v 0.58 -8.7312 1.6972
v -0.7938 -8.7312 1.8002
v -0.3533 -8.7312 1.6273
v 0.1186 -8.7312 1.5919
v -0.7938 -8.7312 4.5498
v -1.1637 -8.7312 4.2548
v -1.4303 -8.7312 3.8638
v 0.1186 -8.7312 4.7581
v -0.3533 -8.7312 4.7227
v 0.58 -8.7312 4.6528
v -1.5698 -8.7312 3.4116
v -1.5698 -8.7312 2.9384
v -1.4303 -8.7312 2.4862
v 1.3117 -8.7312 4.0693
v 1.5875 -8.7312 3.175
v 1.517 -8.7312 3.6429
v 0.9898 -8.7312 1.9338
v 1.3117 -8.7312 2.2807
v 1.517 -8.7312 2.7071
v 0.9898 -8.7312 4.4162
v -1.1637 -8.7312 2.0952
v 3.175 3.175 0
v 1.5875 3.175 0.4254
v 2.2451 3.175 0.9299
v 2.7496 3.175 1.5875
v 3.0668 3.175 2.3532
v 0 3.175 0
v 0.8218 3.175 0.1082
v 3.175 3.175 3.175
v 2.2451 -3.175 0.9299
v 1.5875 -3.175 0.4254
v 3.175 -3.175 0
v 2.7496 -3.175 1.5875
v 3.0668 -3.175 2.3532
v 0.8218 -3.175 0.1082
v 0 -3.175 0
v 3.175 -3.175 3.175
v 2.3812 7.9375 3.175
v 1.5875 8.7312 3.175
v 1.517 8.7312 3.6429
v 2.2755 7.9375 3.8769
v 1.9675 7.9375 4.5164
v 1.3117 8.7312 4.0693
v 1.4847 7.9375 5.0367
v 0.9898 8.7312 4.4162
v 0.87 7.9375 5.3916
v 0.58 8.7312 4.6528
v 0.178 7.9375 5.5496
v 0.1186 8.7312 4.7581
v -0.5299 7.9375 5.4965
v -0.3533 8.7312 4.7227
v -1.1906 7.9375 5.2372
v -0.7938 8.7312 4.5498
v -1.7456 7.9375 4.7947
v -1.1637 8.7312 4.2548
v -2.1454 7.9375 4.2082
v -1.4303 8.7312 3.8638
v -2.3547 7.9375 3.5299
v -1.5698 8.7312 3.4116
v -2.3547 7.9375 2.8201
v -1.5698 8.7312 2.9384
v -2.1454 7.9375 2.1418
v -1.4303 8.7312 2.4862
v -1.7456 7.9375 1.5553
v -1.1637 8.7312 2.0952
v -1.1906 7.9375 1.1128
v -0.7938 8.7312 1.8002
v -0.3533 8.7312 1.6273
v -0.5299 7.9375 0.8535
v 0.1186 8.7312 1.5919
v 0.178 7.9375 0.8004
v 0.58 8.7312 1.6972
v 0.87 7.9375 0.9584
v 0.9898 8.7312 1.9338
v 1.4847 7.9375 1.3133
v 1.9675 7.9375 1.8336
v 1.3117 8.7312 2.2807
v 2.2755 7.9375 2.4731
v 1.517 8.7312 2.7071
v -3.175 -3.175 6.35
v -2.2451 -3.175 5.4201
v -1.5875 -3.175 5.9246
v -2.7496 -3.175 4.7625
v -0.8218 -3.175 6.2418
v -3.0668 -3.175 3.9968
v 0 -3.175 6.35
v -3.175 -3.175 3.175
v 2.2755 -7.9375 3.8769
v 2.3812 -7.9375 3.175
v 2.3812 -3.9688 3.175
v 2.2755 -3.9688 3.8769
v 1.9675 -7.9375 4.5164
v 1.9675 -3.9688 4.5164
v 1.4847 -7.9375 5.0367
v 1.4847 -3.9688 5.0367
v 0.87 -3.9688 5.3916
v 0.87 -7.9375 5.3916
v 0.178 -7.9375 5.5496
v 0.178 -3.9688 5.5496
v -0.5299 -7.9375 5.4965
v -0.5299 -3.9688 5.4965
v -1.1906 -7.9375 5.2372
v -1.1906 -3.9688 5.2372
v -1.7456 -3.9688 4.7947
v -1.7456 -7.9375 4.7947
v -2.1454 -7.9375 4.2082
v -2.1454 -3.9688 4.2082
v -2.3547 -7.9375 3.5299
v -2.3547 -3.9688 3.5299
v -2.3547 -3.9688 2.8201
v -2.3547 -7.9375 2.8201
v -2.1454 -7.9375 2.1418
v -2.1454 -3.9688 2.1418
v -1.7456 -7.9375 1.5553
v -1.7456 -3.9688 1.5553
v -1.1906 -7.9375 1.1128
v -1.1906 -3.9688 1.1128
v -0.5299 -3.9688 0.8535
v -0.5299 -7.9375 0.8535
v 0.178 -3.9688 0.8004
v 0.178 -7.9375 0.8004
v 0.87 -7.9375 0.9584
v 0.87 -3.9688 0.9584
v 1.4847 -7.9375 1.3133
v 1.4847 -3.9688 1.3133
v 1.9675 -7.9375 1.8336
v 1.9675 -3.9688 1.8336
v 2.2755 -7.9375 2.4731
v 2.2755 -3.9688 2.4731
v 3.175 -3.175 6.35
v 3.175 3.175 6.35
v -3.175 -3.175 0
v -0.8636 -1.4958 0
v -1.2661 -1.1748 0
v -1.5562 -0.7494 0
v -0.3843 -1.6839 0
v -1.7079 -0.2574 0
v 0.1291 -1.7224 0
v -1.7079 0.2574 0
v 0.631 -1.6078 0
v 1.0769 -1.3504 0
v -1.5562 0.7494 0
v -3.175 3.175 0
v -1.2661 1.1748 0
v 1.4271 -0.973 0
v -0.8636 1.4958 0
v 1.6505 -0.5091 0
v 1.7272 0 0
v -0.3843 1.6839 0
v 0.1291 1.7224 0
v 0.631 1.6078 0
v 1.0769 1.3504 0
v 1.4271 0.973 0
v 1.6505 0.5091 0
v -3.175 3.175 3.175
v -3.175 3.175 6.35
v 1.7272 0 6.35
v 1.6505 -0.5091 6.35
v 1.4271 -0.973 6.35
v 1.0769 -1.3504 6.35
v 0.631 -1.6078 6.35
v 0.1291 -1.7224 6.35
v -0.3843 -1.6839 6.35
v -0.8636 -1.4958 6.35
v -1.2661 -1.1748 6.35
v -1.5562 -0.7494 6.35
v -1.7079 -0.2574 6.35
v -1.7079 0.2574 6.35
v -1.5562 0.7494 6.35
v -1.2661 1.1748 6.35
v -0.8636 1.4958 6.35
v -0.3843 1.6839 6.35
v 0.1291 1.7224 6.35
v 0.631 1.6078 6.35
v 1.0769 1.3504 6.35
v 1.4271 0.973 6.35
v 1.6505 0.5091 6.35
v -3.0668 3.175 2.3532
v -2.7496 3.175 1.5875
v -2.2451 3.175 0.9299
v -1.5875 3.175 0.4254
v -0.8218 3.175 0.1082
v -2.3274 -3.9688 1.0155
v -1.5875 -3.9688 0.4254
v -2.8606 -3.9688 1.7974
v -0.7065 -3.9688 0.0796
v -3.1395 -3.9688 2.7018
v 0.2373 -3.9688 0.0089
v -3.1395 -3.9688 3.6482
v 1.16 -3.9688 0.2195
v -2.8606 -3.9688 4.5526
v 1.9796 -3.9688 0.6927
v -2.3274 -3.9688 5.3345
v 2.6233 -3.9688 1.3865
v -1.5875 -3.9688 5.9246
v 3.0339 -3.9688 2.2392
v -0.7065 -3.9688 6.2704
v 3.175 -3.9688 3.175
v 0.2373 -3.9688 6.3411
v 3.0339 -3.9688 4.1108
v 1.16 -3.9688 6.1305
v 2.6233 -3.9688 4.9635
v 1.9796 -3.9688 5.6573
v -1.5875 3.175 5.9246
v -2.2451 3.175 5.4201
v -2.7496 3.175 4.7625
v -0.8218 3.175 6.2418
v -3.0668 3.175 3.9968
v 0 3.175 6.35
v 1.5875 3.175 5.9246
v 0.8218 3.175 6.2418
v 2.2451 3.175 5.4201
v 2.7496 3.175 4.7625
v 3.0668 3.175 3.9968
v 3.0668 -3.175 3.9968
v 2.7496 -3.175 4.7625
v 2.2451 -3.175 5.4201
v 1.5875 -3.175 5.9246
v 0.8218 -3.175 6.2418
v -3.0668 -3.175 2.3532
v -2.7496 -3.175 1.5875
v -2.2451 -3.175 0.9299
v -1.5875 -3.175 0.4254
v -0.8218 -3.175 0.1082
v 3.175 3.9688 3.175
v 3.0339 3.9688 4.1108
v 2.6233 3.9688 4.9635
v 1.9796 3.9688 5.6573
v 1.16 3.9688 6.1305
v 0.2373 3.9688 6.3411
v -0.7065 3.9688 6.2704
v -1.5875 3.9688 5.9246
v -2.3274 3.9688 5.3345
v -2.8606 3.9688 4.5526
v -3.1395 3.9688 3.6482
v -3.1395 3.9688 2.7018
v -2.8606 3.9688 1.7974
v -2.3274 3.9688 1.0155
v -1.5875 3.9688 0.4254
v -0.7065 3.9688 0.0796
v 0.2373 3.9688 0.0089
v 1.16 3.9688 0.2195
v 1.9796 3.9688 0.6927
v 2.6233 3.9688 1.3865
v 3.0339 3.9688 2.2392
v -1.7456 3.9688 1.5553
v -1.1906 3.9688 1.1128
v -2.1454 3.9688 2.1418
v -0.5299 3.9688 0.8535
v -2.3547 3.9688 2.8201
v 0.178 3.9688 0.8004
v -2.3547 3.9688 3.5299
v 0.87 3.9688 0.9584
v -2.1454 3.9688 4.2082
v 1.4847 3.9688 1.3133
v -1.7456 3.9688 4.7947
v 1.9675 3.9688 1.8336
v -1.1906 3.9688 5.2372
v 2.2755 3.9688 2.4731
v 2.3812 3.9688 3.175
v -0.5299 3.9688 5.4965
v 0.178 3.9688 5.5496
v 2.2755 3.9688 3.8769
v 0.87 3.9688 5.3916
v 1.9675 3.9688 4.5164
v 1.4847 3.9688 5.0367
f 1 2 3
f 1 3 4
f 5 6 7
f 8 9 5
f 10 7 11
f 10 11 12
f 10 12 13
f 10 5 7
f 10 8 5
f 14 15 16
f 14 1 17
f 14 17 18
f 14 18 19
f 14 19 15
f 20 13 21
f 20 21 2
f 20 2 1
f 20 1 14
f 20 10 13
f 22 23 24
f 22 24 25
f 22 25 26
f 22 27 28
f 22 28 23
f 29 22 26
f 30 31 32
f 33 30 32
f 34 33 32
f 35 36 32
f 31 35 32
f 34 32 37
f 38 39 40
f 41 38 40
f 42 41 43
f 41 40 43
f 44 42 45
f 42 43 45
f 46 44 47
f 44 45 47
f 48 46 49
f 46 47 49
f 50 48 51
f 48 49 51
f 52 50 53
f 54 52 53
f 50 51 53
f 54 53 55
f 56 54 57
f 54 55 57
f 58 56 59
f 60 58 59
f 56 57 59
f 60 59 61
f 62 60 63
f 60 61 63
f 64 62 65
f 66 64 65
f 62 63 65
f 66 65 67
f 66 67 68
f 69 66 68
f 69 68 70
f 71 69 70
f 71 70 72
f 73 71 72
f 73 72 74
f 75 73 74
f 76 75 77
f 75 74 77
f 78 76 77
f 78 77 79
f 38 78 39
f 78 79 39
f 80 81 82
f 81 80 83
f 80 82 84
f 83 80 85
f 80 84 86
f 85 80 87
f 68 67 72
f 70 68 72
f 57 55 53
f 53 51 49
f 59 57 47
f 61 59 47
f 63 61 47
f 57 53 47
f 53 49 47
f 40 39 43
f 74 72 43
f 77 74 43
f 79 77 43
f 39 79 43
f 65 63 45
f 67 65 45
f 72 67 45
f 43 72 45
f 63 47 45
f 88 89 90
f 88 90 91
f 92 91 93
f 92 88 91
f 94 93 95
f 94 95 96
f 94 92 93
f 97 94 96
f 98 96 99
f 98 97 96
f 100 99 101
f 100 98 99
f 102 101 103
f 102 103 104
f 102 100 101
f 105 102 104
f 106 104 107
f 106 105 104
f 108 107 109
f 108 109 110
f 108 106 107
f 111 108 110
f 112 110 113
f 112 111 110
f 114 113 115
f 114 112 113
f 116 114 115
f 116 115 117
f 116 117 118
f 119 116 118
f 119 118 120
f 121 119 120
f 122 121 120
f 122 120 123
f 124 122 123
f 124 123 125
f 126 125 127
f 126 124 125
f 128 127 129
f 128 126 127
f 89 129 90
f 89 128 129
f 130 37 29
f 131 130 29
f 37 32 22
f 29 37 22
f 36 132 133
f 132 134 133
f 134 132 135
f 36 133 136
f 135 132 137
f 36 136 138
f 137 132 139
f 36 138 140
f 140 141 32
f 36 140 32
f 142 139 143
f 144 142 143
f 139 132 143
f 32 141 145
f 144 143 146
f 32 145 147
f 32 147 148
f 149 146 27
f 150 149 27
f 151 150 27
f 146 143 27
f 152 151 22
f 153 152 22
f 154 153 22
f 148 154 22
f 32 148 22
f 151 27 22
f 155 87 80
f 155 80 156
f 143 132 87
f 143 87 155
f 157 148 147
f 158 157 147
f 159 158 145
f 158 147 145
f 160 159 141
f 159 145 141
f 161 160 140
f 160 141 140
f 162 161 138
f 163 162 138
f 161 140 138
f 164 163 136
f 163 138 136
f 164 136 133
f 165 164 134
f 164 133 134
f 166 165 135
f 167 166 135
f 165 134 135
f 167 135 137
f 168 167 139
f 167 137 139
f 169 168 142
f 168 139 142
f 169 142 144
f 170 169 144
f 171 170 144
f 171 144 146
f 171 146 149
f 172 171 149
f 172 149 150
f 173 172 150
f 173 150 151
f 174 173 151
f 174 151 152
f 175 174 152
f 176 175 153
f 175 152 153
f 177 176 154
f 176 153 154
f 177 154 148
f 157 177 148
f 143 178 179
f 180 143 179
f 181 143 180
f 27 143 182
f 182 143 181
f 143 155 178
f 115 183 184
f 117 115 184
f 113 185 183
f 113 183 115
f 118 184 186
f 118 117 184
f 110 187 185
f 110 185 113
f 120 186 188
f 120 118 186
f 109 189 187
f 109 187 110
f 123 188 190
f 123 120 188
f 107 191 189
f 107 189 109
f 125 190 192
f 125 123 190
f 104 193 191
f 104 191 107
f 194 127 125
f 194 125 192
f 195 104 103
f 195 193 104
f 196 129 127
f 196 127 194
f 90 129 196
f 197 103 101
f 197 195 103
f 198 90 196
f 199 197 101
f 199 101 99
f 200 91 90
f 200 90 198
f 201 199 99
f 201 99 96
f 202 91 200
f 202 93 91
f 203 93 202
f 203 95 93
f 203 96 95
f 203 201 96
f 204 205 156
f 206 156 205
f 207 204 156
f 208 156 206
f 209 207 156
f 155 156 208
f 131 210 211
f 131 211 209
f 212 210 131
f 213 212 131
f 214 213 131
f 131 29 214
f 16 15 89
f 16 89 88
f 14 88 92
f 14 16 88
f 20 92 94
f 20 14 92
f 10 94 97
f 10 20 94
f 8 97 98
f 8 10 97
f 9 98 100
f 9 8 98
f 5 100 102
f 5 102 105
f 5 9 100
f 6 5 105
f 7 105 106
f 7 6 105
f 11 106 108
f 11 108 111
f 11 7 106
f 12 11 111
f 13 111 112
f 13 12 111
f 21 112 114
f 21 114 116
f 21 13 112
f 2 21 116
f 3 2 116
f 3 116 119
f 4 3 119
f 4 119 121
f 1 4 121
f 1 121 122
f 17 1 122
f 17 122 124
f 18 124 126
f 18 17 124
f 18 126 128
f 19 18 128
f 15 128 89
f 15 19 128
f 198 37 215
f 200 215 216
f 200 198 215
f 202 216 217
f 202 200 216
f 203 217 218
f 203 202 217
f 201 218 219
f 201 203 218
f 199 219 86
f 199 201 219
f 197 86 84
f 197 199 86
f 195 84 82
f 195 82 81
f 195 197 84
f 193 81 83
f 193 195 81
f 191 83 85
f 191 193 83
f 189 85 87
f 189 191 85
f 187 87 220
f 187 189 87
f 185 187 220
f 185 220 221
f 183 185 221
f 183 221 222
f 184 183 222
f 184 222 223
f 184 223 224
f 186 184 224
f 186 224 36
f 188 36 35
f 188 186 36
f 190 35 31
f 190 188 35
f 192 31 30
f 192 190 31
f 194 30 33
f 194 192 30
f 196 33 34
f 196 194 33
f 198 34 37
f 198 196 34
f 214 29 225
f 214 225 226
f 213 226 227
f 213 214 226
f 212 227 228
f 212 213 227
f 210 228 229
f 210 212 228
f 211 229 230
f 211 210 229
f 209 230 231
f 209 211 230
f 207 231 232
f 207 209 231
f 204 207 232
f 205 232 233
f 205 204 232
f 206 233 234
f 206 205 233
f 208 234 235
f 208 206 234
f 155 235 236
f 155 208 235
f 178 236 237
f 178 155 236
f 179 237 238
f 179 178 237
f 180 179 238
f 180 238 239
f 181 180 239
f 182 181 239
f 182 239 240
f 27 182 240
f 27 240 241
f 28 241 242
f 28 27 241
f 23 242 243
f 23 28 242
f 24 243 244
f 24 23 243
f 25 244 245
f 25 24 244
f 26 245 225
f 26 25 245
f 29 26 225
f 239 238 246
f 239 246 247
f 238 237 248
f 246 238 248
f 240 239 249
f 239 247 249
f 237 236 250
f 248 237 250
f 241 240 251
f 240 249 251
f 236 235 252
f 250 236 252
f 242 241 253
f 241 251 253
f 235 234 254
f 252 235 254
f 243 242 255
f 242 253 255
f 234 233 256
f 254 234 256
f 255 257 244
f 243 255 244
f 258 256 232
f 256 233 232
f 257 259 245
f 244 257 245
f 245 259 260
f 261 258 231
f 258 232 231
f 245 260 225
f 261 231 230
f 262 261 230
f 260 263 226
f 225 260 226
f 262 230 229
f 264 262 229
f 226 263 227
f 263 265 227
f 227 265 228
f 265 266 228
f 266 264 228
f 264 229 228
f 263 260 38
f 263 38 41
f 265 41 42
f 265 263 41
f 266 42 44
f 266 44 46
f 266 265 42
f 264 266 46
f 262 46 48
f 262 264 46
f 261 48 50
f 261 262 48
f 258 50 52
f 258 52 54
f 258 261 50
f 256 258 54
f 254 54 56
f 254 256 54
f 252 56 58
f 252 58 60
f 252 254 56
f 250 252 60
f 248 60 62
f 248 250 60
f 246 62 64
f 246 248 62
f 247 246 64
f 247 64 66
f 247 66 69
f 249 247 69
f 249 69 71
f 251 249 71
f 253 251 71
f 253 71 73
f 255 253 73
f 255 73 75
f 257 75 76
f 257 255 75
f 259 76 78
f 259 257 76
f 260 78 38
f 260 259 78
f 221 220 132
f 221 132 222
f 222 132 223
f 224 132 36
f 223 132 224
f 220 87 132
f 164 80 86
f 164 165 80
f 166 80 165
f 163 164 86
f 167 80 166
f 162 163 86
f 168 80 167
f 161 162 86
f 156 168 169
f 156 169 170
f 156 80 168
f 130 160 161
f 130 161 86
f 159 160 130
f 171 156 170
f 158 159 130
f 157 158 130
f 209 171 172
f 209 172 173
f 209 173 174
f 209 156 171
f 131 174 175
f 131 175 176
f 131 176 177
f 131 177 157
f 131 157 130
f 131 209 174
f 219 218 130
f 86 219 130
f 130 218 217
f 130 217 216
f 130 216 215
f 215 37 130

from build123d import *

# Parameters (mm, degrees)
F0_W     = 6.35
F0_H     = 6.35
F1_DEPTH = 6.35
F2_R     = 3.175
F3_DEPTH = 3.96875
F4_R     = 2.38125
F5_DEPTH = 8.73125
F6_R     = 1.7272
F7_DEPTH = 6.35
F8_SIZE  = 0.79375


with BuildPart() as f1:
    # F0 (on Top) → F1 (new body)
    with BuildSketch(Plane.XY):
        Rectangle(F0_W, F0_H)
    extrude(amount=F1_DEPTH)

    # F2 (on Front) → F3 (join, symmetric)
    with BuildSketch(Plane.XZ):
        with Locations((0, 3.175)):
            Circle(F2_R)
    extrude(amount=F3_DEPTH, both=True)

    # F4 (on Front) → F5 (join, symmetric)
    with BuildSketch(Plane.XZ):
        with Locations((0, 3.175)):
            Circle(F4_R)
    extrude(amount=F5_DEPTH, both=True)

    # F6 (on face) → F7 (cut, through all)
    with BuildSketch(Plane(origin=(0, 0, 0), x_dir=(1, 0, 0), z_dir=(0, 0, -1))):
        Circle(F6_R)
    extrude(amount=-F7_DEPTH, mode=Mode.SUBTRACT)

    # F8
    f8_edges = [f1.edges().sort_by_distance(p)[0] for p in [
        (-2.38125, -8.73125, 3.175),
        (-2.38125, 8.73125, 3.175),
    ]]
    chamfer(f8_edges, length=F8_SIZE)


solid = f1.part
